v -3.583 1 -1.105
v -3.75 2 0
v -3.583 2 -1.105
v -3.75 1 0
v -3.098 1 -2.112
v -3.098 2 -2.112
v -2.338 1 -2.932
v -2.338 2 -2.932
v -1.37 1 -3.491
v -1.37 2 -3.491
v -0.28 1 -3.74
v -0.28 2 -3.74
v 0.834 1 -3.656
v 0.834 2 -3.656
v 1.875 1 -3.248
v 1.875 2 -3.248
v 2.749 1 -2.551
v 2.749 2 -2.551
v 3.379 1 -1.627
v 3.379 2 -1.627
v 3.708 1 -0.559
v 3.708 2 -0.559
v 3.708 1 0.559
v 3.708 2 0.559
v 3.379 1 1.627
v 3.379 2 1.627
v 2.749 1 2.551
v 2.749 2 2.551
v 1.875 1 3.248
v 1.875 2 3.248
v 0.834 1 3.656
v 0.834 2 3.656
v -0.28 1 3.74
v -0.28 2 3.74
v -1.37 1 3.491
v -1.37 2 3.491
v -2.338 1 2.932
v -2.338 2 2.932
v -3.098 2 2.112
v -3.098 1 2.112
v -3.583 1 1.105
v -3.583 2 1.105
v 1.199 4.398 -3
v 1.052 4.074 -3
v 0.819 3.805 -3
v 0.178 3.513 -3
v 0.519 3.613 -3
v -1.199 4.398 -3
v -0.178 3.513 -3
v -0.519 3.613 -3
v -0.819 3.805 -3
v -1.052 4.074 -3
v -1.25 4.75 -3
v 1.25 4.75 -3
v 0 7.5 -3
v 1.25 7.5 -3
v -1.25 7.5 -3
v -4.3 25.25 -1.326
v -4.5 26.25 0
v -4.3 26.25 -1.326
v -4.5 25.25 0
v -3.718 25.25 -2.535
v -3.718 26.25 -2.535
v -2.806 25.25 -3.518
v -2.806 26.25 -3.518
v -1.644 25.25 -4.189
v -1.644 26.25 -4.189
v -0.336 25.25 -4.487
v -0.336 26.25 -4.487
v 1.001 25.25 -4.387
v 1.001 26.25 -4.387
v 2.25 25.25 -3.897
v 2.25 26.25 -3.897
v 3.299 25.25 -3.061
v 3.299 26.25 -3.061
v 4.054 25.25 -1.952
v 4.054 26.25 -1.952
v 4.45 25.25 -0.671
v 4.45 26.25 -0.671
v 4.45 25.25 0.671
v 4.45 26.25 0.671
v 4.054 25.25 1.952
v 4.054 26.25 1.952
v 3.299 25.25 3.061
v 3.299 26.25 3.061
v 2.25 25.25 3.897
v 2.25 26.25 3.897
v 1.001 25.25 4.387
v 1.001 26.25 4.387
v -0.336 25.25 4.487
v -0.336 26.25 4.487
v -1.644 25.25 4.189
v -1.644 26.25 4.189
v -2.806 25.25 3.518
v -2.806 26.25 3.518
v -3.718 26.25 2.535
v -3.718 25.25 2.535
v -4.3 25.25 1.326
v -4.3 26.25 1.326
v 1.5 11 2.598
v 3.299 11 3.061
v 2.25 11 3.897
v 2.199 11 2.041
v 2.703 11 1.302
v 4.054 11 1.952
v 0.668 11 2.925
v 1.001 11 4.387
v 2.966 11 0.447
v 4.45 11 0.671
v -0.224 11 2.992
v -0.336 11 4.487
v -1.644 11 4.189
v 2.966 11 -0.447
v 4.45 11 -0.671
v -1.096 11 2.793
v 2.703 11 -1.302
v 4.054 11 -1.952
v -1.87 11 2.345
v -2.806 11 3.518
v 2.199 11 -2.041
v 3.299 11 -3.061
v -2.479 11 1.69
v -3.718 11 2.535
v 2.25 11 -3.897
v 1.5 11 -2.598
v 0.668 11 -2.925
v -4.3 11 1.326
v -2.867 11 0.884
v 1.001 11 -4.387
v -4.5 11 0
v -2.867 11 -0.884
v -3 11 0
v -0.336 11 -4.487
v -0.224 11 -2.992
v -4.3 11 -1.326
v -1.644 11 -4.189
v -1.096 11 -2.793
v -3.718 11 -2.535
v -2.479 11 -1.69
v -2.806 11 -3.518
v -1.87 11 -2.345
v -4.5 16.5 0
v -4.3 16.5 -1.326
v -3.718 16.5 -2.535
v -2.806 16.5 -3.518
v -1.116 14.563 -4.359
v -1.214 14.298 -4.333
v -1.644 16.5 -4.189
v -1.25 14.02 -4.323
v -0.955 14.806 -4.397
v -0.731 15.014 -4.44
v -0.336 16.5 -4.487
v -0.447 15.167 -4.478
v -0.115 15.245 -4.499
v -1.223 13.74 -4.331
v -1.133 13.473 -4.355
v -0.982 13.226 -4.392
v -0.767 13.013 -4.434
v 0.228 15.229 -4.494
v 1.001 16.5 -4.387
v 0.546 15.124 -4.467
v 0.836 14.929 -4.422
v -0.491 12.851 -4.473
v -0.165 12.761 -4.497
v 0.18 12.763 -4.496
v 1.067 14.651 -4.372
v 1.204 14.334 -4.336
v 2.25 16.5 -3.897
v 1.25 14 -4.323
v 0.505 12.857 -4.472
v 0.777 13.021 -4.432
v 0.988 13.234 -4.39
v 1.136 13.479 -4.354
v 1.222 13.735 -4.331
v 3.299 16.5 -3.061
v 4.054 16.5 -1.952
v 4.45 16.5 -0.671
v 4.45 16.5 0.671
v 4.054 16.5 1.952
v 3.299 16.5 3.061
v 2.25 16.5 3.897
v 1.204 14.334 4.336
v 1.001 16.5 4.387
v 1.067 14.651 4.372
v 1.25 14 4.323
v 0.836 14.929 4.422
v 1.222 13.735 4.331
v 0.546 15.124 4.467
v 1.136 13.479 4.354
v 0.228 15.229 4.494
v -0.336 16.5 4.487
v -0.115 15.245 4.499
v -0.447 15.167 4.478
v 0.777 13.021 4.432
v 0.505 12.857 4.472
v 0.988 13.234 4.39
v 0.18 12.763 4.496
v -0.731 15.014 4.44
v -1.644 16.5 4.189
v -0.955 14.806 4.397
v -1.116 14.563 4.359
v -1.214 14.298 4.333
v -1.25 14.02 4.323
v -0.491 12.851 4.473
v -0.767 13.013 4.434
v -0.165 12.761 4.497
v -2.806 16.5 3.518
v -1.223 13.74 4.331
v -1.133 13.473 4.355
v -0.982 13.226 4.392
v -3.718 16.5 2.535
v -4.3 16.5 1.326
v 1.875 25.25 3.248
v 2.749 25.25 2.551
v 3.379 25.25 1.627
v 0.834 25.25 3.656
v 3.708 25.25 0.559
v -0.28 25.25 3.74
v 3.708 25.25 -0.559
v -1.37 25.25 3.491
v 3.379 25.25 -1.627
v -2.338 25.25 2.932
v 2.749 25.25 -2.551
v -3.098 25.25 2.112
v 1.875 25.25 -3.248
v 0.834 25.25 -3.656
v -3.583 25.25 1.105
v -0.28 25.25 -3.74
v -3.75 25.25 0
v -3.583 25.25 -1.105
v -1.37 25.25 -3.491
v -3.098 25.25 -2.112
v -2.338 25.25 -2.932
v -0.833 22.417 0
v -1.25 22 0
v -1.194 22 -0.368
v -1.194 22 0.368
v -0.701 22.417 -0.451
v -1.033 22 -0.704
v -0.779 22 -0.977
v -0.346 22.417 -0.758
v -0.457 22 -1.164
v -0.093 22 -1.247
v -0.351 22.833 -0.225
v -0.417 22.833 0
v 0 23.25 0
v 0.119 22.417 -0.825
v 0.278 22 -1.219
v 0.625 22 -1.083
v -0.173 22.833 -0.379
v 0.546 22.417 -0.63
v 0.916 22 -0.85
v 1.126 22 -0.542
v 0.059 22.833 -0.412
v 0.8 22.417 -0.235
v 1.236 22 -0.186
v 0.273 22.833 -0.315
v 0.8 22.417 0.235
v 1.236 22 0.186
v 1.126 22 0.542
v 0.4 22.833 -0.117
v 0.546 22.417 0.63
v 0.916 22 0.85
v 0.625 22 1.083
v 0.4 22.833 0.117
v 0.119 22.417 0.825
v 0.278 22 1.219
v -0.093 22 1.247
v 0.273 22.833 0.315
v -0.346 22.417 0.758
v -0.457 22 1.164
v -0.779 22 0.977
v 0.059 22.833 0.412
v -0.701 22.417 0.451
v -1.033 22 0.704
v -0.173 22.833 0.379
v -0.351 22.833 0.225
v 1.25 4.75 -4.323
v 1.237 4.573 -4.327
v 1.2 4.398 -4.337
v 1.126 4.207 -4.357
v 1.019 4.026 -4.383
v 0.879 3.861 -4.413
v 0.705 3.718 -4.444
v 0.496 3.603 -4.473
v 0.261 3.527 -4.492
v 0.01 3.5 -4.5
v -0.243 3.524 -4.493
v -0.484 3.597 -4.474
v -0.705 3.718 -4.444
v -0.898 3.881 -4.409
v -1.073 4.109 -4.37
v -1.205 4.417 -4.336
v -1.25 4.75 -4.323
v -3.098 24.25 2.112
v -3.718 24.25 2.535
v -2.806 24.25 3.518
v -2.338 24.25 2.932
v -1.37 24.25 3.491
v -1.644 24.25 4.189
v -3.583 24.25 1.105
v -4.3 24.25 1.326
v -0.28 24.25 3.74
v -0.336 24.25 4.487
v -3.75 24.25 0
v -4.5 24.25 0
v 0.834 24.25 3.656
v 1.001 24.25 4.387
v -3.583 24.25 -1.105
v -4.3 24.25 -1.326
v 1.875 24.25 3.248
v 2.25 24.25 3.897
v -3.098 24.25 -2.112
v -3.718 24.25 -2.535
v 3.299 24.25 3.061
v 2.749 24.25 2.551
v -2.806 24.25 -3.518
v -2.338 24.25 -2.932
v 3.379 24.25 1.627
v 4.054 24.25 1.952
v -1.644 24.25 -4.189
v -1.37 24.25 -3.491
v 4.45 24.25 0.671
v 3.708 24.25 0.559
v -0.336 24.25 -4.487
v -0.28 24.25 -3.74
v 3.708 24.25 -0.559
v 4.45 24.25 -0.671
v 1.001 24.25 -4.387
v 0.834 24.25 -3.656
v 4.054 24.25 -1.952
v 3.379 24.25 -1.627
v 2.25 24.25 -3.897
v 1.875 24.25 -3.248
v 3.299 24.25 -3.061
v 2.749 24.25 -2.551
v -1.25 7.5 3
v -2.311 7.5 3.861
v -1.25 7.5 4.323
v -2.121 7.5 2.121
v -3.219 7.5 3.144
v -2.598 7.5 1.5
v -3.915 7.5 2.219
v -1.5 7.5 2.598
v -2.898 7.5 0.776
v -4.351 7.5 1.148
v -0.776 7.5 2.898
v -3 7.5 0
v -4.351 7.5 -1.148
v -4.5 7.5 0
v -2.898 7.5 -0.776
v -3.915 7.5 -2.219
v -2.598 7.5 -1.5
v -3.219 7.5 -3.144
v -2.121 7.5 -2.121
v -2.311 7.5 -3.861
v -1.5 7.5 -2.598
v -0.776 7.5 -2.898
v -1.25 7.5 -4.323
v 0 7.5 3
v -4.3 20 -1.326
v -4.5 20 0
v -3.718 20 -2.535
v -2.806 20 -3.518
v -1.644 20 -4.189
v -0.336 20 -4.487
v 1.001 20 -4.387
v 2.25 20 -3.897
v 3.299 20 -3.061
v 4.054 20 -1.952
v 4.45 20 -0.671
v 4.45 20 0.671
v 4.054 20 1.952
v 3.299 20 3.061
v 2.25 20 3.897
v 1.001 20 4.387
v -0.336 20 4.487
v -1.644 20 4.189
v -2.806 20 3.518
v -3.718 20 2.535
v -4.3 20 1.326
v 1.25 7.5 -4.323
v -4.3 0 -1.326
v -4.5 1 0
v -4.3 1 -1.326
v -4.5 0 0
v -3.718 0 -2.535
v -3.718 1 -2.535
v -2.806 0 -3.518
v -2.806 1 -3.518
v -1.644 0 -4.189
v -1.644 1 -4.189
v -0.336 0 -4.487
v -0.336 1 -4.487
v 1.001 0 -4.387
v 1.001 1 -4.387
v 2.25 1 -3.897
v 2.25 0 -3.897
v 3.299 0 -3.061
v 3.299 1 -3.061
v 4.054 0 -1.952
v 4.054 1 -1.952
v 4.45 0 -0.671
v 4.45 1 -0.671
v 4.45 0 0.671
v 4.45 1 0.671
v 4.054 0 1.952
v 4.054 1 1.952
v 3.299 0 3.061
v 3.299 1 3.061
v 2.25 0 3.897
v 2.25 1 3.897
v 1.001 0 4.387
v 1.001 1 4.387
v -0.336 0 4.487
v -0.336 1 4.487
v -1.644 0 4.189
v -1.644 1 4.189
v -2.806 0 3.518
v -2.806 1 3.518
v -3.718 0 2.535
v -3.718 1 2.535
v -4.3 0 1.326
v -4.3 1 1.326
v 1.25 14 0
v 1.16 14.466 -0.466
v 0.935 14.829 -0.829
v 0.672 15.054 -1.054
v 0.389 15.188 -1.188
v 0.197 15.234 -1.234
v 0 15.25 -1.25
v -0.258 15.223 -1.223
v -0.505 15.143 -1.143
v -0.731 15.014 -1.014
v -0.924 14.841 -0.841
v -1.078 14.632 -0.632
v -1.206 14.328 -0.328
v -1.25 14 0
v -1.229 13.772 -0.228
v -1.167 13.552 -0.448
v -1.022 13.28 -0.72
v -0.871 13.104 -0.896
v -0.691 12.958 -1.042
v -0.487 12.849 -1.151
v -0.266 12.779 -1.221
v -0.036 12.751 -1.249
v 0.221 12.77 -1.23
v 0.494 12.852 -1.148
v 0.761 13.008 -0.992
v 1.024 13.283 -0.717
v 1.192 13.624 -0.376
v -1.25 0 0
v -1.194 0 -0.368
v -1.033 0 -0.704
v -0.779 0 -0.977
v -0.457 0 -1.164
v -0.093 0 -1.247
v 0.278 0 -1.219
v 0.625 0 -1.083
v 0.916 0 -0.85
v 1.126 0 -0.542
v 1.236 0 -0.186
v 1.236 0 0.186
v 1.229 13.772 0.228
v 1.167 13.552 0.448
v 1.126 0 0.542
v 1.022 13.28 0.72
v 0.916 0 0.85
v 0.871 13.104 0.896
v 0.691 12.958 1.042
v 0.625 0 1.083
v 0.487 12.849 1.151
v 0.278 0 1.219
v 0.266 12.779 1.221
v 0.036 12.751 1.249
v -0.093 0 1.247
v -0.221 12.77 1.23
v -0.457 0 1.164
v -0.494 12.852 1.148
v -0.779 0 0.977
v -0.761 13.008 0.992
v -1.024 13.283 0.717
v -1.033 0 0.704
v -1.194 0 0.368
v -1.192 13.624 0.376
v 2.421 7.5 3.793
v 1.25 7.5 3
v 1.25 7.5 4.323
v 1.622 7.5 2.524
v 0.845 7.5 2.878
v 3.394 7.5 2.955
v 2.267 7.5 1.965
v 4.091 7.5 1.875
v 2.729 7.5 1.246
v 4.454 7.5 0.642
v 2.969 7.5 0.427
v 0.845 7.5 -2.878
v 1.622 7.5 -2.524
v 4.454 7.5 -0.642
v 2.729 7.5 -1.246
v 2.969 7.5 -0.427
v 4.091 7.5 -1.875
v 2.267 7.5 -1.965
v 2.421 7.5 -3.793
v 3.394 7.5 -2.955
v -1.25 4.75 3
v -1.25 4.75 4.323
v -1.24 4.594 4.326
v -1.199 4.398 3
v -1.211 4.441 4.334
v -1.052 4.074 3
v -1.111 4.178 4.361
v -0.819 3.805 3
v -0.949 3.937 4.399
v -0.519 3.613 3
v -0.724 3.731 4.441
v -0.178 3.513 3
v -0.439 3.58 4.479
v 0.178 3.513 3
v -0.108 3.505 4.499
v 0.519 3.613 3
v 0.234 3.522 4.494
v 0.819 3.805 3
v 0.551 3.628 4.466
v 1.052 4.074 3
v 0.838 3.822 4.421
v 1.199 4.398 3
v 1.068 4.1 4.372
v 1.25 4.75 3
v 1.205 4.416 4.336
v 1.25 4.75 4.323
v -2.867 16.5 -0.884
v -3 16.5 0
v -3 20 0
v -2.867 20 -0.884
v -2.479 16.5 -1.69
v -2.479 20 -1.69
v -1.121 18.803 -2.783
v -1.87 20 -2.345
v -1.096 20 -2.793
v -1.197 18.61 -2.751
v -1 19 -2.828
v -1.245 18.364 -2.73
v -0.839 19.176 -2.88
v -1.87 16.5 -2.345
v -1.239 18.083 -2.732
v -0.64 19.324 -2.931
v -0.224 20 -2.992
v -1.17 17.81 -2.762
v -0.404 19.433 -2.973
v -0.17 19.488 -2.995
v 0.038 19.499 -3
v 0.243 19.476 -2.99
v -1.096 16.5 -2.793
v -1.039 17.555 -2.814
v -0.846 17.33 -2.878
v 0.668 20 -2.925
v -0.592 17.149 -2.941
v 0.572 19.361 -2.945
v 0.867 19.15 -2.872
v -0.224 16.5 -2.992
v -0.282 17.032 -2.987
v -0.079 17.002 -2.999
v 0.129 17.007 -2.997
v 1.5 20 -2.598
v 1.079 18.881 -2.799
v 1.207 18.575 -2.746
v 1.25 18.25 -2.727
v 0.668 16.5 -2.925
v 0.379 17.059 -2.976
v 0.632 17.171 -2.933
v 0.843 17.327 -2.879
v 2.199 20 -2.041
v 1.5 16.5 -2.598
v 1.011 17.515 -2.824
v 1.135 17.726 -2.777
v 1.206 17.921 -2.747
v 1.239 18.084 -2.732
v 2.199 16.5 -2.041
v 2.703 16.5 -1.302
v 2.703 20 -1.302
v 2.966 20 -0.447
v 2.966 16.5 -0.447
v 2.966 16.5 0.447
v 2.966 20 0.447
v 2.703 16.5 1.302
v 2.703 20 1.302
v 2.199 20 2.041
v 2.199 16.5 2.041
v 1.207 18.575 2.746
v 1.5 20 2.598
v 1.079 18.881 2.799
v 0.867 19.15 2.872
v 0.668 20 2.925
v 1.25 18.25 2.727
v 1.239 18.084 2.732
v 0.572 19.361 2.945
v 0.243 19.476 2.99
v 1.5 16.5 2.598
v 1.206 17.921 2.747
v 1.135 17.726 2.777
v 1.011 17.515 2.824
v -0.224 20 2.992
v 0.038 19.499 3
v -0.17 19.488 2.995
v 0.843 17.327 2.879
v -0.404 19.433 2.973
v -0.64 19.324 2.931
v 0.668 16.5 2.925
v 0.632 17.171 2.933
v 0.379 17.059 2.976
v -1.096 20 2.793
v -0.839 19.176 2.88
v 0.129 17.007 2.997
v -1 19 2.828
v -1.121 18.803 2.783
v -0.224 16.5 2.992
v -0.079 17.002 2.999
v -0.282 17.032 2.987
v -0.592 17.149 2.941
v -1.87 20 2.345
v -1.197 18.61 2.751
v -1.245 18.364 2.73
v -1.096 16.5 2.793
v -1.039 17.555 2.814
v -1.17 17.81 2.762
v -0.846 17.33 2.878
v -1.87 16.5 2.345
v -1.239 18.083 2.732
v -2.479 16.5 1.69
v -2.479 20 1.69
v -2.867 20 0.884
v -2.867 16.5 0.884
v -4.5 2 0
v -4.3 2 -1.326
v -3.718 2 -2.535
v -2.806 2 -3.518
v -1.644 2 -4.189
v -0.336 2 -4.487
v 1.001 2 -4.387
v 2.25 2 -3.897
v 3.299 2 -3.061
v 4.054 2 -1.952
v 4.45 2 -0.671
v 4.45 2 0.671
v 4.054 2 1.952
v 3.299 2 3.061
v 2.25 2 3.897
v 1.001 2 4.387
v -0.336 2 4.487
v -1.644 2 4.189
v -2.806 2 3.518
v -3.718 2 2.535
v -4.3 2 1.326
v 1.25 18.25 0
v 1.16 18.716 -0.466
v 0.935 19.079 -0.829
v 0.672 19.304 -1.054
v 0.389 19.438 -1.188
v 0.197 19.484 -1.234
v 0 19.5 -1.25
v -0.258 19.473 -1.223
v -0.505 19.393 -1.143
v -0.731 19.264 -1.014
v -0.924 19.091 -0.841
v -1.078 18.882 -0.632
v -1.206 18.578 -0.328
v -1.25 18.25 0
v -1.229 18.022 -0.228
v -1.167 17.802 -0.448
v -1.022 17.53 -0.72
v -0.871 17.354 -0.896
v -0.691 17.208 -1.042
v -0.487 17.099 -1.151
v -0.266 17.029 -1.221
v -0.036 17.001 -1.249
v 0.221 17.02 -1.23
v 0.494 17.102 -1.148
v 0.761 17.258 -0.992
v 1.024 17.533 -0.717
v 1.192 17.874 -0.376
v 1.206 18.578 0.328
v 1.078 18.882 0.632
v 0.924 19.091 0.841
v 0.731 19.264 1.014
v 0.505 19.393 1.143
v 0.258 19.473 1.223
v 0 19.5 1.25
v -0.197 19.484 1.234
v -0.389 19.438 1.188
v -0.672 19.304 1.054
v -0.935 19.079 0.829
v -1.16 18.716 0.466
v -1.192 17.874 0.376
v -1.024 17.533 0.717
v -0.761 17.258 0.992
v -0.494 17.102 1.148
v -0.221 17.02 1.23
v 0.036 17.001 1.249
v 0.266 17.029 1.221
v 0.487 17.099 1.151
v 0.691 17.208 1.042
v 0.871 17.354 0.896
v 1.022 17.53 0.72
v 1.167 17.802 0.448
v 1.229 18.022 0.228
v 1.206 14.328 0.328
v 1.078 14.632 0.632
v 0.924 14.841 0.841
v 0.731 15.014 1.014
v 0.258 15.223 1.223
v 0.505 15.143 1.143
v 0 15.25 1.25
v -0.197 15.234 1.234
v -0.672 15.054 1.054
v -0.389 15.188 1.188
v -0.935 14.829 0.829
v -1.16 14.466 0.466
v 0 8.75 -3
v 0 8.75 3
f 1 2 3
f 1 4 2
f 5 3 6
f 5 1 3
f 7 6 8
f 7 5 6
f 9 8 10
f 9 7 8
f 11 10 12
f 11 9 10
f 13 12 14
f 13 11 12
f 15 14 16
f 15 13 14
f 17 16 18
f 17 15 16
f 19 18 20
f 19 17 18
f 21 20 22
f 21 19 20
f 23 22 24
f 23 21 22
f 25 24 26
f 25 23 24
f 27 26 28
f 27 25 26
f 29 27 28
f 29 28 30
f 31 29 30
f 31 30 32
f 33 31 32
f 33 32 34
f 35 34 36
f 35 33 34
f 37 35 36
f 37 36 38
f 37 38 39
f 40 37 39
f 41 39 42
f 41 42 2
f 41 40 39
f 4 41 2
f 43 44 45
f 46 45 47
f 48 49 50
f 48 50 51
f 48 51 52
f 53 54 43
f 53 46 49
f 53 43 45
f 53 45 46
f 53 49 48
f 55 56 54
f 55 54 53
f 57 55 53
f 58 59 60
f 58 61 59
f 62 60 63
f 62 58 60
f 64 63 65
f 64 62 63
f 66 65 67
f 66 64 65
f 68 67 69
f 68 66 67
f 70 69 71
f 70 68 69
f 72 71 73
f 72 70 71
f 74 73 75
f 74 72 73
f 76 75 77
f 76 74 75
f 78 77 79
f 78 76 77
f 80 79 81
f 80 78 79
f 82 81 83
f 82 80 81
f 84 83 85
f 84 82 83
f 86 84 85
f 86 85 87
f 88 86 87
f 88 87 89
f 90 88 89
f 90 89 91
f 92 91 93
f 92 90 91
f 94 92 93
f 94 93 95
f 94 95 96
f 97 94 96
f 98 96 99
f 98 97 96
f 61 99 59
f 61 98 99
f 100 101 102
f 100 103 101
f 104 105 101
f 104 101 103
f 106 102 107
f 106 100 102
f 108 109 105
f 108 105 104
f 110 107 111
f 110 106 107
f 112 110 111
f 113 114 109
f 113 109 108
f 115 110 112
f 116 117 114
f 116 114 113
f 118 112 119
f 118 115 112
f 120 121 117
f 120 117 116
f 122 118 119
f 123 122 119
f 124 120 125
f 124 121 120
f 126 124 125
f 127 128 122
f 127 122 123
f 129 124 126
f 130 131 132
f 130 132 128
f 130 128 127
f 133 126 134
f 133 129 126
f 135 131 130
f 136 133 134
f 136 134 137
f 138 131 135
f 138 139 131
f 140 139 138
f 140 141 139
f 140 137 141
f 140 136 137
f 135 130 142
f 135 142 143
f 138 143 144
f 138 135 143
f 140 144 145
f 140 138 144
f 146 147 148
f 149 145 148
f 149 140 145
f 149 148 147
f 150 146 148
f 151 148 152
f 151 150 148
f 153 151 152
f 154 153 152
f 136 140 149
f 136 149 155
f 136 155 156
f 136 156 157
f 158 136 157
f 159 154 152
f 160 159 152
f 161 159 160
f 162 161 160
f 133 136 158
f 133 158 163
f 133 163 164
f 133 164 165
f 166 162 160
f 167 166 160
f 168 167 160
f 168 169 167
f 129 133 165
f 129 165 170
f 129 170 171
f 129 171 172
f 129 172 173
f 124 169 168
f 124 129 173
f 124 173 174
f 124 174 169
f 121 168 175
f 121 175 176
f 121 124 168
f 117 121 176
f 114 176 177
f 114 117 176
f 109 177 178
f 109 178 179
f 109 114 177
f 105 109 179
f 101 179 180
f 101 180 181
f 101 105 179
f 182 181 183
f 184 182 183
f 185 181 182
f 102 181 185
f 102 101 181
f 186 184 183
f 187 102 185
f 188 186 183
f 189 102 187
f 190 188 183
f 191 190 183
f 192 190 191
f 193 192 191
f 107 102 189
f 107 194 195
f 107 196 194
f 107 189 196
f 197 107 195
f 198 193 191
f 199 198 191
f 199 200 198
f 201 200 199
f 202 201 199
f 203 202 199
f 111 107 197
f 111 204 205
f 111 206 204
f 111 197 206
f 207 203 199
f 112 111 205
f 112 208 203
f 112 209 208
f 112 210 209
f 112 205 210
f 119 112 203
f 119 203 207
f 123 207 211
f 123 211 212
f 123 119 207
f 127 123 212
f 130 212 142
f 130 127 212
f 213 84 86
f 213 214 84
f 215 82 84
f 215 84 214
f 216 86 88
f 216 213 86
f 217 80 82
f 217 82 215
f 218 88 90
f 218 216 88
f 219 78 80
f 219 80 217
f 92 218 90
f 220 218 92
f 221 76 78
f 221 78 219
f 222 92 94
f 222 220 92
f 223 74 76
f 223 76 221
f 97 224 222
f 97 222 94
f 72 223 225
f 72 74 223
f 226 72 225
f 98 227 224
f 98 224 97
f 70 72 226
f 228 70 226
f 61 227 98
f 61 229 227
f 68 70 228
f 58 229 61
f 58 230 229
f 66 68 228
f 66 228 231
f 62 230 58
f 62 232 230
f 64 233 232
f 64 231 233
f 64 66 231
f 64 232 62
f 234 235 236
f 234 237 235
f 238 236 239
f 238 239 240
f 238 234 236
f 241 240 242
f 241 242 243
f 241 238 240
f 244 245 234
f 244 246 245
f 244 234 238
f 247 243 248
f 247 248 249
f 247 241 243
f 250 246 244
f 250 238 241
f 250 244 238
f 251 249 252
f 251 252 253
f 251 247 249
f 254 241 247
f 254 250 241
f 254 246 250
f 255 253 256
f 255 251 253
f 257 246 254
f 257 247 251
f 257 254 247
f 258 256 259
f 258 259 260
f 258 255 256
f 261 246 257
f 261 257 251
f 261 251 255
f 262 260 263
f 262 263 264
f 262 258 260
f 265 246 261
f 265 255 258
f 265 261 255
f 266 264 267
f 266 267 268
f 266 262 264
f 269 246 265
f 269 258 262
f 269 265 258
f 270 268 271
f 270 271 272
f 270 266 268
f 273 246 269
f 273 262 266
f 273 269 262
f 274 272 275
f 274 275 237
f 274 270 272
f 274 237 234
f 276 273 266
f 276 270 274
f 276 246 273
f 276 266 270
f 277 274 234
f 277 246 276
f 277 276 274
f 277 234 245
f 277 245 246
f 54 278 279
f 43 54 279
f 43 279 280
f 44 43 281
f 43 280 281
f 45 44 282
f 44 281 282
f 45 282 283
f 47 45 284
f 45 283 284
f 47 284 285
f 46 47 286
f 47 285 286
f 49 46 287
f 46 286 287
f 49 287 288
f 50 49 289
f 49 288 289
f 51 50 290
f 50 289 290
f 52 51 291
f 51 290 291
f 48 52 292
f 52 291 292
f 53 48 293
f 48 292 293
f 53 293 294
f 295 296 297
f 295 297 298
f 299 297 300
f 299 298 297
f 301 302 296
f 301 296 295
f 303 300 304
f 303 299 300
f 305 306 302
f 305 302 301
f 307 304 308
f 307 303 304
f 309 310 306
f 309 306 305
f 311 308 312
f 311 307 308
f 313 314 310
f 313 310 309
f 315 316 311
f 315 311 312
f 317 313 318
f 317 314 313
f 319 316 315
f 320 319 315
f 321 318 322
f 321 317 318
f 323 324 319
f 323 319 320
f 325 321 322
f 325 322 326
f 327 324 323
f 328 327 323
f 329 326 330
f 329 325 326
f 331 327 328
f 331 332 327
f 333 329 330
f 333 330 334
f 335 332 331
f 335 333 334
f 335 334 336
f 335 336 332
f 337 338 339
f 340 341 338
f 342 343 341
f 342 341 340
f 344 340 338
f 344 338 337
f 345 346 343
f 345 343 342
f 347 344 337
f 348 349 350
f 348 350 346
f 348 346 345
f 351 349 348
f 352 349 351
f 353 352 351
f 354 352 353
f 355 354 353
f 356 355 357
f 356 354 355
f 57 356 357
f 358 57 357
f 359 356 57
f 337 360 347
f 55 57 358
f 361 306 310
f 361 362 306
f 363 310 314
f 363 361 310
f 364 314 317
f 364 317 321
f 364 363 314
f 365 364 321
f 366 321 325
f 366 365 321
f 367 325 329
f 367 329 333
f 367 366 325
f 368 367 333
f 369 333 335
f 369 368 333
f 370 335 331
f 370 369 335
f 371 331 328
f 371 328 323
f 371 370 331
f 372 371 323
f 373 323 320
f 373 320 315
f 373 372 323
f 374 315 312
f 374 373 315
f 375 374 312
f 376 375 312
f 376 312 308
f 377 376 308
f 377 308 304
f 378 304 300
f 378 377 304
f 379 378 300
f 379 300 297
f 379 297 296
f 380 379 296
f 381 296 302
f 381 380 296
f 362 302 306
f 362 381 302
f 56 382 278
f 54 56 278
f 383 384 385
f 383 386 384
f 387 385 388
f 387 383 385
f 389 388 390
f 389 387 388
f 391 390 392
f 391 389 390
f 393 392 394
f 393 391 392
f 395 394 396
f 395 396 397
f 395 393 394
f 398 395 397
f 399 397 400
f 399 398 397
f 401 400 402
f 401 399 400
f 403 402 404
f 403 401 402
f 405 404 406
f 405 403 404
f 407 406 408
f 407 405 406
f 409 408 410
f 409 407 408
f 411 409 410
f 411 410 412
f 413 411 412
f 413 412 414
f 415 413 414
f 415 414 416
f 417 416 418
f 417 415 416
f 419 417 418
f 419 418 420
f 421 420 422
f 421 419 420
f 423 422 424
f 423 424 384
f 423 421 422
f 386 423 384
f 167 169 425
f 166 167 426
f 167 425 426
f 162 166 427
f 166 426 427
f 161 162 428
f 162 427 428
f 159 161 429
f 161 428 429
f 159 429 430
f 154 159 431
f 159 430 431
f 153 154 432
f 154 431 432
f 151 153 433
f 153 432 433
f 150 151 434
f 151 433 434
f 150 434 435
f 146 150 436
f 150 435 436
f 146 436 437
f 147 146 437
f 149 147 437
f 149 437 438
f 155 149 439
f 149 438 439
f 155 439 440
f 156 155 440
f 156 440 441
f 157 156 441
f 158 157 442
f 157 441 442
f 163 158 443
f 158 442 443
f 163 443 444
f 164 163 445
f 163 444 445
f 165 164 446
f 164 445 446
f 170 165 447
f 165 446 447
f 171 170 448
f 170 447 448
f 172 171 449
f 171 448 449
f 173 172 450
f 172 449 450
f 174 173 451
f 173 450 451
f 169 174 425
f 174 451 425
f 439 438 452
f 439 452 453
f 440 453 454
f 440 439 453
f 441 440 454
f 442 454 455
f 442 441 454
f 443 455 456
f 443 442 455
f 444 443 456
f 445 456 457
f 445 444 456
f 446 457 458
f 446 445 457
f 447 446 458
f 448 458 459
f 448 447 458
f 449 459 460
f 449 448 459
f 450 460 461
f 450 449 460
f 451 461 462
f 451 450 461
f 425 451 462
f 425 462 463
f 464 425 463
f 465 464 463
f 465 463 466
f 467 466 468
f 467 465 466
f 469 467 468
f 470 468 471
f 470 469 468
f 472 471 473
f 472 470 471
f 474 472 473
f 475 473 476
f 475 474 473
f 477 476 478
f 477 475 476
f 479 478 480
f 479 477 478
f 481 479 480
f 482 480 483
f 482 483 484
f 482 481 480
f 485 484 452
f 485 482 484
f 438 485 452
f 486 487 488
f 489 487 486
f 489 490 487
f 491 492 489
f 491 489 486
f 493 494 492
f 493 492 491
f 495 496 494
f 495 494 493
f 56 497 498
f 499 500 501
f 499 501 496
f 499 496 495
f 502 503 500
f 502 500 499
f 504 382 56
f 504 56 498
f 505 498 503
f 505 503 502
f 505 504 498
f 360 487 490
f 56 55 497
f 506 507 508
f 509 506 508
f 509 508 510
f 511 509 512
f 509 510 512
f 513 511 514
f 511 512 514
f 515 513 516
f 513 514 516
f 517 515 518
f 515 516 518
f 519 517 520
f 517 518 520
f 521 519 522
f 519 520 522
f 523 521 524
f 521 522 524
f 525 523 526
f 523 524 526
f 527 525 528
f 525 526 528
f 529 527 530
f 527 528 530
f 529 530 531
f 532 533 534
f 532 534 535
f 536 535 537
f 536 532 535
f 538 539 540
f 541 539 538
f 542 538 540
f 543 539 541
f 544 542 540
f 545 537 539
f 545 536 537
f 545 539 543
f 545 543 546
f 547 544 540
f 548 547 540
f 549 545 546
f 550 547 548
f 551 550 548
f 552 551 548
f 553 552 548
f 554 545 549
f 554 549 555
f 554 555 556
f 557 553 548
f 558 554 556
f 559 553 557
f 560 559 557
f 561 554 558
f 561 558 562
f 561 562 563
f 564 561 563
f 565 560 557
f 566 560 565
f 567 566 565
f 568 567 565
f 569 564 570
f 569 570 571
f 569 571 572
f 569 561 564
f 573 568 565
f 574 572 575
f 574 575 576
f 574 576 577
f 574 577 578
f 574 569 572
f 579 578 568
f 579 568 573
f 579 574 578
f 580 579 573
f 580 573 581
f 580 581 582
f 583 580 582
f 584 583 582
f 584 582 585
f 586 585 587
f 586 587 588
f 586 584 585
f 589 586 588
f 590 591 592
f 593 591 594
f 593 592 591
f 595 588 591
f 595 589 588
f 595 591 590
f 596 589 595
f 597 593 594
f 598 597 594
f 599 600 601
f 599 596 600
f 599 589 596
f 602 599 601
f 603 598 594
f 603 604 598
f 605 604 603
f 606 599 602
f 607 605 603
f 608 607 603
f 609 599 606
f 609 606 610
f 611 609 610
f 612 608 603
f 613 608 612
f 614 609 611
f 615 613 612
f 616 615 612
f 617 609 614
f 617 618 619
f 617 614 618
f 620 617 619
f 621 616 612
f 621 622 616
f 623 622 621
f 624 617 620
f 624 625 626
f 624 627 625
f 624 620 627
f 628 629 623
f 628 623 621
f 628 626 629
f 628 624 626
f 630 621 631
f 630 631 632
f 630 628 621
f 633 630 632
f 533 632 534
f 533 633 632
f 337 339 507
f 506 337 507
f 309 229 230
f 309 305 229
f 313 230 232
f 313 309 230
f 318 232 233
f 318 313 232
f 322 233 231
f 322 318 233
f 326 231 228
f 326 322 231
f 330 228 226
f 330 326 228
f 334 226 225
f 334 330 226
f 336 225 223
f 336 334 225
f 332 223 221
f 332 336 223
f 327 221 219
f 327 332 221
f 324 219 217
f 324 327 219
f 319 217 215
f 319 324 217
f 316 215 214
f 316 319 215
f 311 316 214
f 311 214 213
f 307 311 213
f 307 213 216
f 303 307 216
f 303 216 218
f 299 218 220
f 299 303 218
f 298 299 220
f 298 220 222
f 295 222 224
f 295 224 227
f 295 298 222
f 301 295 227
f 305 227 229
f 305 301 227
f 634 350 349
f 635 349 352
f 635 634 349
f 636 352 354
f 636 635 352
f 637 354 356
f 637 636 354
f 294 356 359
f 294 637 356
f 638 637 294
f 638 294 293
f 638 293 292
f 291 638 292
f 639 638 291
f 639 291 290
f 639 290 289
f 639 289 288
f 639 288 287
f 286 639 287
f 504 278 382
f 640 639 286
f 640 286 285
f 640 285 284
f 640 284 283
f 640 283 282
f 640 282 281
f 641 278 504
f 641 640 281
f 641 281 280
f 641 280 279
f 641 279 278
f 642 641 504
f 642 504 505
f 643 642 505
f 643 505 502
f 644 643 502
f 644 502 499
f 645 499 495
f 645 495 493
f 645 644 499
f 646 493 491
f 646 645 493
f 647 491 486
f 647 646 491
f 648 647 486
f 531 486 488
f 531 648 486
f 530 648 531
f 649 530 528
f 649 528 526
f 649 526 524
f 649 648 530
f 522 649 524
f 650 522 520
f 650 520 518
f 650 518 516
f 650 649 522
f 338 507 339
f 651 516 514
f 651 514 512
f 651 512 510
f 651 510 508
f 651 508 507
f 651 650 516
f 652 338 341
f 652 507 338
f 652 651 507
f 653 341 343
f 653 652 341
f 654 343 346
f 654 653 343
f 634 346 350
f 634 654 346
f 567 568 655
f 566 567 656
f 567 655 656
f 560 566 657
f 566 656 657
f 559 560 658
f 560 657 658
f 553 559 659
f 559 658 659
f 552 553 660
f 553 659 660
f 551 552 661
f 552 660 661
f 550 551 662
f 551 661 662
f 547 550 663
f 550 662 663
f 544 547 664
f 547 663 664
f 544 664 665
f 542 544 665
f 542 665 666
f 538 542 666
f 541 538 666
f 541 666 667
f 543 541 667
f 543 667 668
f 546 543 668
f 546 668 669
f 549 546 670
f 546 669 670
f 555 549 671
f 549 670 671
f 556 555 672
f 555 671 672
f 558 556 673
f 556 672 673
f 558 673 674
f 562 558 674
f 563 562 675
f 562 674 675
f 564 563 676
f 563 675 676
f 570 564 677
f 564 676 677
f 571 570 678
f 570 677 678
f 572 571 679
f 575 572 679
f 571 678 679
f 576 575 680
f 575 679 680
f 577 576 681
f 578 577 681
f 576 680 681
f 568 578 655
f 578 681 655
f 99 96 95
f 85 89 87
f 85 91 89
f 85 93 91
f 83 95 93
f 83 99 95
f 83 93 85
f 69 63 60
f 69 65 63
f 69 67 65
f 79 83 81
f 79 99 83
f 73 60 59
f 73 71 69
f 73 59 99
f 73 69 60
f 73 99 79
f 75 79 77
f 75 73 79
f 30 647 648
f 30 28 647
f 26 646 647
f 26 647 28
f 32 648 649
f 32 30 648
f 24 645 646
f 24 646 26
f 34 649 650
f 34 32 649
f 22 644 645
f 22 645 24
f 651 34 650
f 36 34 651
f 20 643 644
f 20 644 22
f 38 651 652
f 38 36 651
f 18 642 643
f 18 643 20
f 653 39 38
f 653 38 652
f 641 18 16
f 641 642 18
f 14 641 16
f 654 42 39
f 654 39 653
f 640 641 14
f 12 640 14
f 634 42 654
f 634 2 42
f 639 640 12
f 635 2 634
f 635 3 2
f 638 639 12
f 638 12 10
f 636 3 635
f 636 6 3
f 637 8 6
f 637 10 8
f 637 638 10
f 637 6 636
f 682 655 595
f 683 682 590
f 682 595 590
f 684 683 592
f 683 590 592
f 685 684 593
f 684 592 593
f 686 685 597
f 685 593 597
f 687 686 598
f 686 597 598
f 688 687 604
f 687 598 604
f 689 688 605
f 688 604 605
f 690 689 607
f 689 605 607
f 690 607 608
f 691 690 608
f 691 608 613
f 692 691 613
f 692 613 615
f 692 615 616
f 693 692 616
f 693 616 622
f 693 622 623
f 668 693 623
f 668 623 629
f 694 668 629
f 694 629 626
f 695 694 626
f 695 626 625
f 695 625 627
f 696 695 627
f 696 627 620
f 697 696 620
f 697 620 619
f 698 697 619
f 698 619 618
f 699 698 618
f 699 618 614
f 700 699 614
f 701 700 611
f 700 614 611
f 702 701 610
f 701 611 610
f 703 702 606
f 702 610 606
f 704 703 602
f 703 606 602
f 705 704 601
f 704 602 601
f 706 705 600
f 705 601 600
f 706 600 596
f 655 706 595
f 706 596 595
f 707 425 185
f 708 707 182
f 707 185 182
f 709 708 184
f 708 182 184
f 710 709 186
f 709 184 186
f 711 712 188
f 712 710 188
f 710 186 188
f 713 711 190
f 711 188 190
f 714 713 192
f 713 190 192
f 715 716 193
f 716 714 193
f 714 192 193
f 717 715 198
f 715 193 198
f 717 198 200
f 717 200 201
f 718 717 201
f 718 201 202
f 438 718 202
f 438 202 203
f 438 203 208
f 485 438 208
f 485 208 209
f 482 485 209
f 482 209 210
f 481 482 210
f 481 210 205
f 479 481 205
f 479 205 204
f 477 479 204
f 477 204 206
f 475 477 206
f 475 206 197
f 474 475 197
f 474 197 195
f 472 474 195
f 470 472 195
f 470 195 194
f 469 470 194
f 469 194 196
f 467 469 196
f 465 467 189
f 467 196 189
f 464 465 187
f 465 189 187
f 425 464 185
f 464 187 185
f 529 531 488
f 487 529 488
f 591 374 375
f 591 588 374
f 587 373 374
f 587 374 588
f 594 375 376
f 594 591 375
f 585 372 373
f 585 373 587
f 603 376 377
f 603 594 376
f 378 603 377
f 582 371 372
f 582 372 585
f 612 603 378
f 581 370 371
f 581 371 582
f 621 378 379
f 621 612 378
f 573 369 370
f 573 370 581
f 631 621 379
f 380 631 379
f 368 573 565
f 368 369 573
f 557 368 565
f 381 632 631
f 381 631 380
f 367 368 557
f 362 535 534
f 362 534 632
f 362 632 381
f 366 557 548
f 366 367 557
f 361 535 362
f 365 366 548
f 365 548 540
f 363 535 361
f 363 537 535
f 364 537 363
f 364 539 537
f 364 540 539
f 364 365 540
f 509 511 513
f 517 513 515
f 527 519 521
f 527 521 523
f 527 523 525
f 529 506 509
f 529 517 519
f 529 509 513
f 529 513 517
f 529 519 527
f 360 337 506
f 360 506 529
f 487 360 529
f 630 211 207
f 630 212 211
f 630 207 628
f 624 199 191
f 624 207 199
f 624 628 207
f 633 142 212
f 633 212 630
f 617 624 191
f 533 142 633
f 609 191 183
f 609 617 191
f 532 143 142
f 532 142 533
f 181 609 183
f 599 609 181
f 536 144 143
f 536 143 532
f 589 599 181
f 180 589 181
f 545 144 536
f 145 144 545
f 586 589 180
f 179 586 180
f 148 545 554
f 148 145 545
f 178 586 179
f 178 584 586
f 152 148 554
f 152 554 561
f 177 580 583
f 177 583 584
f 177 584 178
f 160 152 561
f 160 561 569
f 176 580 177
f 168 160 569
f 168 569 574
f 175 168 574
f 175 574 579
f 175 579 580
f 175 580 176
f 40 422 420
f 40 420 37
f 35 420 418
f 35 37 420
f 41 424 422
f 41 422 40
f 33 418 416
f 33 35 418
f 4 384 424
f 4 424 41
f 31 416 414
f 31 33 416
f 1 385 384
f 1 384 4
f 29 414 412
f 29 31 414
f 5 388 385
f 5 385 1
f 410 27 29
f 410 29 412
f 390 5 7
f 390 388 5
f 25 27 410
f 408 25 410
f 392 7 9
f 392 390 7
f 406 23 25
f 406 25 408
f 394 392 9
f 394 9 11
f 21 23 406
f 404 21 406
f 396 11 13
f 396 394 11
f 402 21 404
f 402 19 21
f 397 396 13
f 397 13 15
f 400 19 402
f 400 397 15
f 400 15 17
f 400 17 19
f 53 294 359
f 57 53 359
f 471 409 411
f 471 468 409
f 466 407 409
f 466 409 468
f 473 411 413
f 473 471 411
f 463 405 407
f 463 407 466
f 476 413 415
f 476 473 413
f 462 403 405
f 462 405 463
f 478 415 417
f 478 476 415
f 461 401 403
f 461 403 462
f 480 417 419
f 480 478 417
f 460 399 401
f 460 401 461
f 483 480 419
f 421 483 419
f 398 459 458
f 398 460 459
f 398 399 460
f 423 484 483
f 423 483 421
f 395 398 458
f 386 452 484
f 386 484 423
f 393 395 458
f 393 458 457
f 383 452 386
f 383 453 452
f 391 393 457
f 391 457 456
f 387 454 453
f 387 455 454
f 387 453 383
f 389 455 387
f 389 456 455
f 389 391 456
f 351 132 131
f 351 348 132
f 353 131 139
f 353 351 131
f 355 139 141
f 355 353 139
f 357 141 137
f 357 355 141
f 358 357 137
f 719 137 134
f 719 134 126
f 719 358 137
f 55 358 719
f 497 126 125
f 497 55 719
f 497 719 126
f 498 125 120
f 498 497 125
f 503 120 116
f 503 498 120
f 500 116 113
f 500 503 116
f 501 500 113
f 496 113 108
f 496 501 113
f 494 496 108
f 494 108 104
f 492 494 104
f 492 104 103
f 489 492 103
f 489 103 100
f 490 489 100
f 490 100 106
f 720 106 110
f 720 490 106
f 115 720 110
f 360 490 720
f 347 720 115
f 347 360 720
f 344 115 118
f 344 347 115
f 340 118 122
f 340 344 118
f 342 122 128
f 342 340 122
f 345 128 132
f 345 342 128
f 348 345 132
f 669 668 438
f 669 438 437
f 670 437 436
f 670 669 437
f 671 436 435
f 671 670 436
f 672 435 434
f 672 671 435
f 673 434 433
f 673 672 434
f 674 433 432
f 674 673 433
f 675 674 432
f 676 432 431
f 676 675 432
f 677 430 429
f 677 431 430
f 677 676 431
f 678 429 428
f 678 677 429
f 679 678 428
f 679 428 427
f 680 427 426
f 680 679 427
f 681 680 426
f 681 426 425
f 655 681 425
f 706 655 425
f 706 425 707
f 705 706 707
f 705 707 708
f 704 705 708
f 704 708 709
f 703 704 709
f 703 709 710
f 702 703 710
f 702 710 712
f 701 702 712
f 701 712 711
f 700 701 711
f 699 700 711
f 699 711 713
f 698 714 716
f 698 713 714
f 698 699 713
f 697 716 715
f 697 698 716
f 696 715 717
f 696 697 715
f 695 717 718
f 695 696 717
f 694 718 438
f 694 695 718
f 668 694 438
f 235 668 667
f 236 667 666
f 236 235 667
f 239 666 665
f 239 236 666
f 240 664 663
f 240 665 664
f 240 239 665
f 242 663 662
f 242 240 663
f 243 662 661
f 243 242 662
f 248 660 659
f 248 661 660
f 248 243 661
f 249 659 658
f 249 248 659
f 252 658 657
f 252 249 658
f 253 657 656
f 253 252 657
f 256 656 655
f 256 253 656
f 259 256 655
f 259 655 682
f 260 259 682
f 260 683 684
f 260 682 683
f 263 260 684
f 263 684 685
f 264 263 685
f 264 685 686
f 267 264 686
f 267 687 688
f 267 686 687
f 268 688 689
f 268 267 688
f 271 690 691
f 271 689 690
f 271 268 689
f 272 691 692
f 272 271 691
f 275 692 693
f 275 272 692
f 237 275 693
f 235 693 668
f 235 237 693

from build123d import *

# Parameters (mm, degrees)
F4_DEPTH = 1.5
F3_R     = 1.25
F5_DEPTH = 25
F6_COUNT = 2
F6_ANGLE = 180


with BuildPart() as f1:
    # F0 (on Top) → F1 (revolve)
    with BuildSketch(Plane.XY):
        Polygon((-4.5, 0), (-2.5, 0), (-1.25, 0), (-1.25, 22), (0, 23.25), (0, 26.25), (-4.5, 26.25), (-4.5, 25.25), (-3.75, 25.25), (-3.75, 24.25), (-4.5, 24.25), (-4.5, 20), (-3, 20), (-3, 16.5), (-4.5, 16.5), (-4.5, 11), (-3, 11), (-3, 7.5), (-4.5, 7.5), (-4.5, 2), (-3.75, 2), (-3.75, 1), (-4.5, 1), align=None)
    revolve(axis=Axis((0, 2.3840577891, 0), (0, -1, 0)))

    # F3 (on offset) → F5 (cut)
    with BuildSketch(Plane.XY.offset(4.5)):
        with Locations((0, 14)):
            Circle(F3_R)
        with Locations((0, 18.25)):
            Circle(F3_R)
    extrude(amount=-F5_DEPTH, mode=Mode.SUBTRACT)


with BuildPart() as f4:
    # F3 (on offset) → F4 (new body)
    with BuildSketch(Plane.XY.offset(4.5)):
        with BuildLine():
            Line((-1.25, 8.75), (-1.25, 4.75))
            ThreePointArc((-1.25, 4.75), (0, 3.5), (1.25, 4.75))
            Line((1.25, 4.75), (1.25, 8.75))
            Line((1.25, 8.75), (-1.25, 8.75))
        make_face()
    extrude(amount=-F4_DEPTH)


with BuildPart() as f6_1:
    # F6: instance of F4
    add(f4.part.rotate(Axis((0, 0, 0), (0, -1, 0)), 1 * F6_ANGLE / (F6_COUNT - 1)))


with BuildPart() as f1_1:
    add(f1.part)

    # F7: cut F4, F6_1
    add(f4.part, mode=Mode.SUBTRACT)
    add(f6_1.part, mode=Mode.SUBTRACT)


solid = f1_1.part
